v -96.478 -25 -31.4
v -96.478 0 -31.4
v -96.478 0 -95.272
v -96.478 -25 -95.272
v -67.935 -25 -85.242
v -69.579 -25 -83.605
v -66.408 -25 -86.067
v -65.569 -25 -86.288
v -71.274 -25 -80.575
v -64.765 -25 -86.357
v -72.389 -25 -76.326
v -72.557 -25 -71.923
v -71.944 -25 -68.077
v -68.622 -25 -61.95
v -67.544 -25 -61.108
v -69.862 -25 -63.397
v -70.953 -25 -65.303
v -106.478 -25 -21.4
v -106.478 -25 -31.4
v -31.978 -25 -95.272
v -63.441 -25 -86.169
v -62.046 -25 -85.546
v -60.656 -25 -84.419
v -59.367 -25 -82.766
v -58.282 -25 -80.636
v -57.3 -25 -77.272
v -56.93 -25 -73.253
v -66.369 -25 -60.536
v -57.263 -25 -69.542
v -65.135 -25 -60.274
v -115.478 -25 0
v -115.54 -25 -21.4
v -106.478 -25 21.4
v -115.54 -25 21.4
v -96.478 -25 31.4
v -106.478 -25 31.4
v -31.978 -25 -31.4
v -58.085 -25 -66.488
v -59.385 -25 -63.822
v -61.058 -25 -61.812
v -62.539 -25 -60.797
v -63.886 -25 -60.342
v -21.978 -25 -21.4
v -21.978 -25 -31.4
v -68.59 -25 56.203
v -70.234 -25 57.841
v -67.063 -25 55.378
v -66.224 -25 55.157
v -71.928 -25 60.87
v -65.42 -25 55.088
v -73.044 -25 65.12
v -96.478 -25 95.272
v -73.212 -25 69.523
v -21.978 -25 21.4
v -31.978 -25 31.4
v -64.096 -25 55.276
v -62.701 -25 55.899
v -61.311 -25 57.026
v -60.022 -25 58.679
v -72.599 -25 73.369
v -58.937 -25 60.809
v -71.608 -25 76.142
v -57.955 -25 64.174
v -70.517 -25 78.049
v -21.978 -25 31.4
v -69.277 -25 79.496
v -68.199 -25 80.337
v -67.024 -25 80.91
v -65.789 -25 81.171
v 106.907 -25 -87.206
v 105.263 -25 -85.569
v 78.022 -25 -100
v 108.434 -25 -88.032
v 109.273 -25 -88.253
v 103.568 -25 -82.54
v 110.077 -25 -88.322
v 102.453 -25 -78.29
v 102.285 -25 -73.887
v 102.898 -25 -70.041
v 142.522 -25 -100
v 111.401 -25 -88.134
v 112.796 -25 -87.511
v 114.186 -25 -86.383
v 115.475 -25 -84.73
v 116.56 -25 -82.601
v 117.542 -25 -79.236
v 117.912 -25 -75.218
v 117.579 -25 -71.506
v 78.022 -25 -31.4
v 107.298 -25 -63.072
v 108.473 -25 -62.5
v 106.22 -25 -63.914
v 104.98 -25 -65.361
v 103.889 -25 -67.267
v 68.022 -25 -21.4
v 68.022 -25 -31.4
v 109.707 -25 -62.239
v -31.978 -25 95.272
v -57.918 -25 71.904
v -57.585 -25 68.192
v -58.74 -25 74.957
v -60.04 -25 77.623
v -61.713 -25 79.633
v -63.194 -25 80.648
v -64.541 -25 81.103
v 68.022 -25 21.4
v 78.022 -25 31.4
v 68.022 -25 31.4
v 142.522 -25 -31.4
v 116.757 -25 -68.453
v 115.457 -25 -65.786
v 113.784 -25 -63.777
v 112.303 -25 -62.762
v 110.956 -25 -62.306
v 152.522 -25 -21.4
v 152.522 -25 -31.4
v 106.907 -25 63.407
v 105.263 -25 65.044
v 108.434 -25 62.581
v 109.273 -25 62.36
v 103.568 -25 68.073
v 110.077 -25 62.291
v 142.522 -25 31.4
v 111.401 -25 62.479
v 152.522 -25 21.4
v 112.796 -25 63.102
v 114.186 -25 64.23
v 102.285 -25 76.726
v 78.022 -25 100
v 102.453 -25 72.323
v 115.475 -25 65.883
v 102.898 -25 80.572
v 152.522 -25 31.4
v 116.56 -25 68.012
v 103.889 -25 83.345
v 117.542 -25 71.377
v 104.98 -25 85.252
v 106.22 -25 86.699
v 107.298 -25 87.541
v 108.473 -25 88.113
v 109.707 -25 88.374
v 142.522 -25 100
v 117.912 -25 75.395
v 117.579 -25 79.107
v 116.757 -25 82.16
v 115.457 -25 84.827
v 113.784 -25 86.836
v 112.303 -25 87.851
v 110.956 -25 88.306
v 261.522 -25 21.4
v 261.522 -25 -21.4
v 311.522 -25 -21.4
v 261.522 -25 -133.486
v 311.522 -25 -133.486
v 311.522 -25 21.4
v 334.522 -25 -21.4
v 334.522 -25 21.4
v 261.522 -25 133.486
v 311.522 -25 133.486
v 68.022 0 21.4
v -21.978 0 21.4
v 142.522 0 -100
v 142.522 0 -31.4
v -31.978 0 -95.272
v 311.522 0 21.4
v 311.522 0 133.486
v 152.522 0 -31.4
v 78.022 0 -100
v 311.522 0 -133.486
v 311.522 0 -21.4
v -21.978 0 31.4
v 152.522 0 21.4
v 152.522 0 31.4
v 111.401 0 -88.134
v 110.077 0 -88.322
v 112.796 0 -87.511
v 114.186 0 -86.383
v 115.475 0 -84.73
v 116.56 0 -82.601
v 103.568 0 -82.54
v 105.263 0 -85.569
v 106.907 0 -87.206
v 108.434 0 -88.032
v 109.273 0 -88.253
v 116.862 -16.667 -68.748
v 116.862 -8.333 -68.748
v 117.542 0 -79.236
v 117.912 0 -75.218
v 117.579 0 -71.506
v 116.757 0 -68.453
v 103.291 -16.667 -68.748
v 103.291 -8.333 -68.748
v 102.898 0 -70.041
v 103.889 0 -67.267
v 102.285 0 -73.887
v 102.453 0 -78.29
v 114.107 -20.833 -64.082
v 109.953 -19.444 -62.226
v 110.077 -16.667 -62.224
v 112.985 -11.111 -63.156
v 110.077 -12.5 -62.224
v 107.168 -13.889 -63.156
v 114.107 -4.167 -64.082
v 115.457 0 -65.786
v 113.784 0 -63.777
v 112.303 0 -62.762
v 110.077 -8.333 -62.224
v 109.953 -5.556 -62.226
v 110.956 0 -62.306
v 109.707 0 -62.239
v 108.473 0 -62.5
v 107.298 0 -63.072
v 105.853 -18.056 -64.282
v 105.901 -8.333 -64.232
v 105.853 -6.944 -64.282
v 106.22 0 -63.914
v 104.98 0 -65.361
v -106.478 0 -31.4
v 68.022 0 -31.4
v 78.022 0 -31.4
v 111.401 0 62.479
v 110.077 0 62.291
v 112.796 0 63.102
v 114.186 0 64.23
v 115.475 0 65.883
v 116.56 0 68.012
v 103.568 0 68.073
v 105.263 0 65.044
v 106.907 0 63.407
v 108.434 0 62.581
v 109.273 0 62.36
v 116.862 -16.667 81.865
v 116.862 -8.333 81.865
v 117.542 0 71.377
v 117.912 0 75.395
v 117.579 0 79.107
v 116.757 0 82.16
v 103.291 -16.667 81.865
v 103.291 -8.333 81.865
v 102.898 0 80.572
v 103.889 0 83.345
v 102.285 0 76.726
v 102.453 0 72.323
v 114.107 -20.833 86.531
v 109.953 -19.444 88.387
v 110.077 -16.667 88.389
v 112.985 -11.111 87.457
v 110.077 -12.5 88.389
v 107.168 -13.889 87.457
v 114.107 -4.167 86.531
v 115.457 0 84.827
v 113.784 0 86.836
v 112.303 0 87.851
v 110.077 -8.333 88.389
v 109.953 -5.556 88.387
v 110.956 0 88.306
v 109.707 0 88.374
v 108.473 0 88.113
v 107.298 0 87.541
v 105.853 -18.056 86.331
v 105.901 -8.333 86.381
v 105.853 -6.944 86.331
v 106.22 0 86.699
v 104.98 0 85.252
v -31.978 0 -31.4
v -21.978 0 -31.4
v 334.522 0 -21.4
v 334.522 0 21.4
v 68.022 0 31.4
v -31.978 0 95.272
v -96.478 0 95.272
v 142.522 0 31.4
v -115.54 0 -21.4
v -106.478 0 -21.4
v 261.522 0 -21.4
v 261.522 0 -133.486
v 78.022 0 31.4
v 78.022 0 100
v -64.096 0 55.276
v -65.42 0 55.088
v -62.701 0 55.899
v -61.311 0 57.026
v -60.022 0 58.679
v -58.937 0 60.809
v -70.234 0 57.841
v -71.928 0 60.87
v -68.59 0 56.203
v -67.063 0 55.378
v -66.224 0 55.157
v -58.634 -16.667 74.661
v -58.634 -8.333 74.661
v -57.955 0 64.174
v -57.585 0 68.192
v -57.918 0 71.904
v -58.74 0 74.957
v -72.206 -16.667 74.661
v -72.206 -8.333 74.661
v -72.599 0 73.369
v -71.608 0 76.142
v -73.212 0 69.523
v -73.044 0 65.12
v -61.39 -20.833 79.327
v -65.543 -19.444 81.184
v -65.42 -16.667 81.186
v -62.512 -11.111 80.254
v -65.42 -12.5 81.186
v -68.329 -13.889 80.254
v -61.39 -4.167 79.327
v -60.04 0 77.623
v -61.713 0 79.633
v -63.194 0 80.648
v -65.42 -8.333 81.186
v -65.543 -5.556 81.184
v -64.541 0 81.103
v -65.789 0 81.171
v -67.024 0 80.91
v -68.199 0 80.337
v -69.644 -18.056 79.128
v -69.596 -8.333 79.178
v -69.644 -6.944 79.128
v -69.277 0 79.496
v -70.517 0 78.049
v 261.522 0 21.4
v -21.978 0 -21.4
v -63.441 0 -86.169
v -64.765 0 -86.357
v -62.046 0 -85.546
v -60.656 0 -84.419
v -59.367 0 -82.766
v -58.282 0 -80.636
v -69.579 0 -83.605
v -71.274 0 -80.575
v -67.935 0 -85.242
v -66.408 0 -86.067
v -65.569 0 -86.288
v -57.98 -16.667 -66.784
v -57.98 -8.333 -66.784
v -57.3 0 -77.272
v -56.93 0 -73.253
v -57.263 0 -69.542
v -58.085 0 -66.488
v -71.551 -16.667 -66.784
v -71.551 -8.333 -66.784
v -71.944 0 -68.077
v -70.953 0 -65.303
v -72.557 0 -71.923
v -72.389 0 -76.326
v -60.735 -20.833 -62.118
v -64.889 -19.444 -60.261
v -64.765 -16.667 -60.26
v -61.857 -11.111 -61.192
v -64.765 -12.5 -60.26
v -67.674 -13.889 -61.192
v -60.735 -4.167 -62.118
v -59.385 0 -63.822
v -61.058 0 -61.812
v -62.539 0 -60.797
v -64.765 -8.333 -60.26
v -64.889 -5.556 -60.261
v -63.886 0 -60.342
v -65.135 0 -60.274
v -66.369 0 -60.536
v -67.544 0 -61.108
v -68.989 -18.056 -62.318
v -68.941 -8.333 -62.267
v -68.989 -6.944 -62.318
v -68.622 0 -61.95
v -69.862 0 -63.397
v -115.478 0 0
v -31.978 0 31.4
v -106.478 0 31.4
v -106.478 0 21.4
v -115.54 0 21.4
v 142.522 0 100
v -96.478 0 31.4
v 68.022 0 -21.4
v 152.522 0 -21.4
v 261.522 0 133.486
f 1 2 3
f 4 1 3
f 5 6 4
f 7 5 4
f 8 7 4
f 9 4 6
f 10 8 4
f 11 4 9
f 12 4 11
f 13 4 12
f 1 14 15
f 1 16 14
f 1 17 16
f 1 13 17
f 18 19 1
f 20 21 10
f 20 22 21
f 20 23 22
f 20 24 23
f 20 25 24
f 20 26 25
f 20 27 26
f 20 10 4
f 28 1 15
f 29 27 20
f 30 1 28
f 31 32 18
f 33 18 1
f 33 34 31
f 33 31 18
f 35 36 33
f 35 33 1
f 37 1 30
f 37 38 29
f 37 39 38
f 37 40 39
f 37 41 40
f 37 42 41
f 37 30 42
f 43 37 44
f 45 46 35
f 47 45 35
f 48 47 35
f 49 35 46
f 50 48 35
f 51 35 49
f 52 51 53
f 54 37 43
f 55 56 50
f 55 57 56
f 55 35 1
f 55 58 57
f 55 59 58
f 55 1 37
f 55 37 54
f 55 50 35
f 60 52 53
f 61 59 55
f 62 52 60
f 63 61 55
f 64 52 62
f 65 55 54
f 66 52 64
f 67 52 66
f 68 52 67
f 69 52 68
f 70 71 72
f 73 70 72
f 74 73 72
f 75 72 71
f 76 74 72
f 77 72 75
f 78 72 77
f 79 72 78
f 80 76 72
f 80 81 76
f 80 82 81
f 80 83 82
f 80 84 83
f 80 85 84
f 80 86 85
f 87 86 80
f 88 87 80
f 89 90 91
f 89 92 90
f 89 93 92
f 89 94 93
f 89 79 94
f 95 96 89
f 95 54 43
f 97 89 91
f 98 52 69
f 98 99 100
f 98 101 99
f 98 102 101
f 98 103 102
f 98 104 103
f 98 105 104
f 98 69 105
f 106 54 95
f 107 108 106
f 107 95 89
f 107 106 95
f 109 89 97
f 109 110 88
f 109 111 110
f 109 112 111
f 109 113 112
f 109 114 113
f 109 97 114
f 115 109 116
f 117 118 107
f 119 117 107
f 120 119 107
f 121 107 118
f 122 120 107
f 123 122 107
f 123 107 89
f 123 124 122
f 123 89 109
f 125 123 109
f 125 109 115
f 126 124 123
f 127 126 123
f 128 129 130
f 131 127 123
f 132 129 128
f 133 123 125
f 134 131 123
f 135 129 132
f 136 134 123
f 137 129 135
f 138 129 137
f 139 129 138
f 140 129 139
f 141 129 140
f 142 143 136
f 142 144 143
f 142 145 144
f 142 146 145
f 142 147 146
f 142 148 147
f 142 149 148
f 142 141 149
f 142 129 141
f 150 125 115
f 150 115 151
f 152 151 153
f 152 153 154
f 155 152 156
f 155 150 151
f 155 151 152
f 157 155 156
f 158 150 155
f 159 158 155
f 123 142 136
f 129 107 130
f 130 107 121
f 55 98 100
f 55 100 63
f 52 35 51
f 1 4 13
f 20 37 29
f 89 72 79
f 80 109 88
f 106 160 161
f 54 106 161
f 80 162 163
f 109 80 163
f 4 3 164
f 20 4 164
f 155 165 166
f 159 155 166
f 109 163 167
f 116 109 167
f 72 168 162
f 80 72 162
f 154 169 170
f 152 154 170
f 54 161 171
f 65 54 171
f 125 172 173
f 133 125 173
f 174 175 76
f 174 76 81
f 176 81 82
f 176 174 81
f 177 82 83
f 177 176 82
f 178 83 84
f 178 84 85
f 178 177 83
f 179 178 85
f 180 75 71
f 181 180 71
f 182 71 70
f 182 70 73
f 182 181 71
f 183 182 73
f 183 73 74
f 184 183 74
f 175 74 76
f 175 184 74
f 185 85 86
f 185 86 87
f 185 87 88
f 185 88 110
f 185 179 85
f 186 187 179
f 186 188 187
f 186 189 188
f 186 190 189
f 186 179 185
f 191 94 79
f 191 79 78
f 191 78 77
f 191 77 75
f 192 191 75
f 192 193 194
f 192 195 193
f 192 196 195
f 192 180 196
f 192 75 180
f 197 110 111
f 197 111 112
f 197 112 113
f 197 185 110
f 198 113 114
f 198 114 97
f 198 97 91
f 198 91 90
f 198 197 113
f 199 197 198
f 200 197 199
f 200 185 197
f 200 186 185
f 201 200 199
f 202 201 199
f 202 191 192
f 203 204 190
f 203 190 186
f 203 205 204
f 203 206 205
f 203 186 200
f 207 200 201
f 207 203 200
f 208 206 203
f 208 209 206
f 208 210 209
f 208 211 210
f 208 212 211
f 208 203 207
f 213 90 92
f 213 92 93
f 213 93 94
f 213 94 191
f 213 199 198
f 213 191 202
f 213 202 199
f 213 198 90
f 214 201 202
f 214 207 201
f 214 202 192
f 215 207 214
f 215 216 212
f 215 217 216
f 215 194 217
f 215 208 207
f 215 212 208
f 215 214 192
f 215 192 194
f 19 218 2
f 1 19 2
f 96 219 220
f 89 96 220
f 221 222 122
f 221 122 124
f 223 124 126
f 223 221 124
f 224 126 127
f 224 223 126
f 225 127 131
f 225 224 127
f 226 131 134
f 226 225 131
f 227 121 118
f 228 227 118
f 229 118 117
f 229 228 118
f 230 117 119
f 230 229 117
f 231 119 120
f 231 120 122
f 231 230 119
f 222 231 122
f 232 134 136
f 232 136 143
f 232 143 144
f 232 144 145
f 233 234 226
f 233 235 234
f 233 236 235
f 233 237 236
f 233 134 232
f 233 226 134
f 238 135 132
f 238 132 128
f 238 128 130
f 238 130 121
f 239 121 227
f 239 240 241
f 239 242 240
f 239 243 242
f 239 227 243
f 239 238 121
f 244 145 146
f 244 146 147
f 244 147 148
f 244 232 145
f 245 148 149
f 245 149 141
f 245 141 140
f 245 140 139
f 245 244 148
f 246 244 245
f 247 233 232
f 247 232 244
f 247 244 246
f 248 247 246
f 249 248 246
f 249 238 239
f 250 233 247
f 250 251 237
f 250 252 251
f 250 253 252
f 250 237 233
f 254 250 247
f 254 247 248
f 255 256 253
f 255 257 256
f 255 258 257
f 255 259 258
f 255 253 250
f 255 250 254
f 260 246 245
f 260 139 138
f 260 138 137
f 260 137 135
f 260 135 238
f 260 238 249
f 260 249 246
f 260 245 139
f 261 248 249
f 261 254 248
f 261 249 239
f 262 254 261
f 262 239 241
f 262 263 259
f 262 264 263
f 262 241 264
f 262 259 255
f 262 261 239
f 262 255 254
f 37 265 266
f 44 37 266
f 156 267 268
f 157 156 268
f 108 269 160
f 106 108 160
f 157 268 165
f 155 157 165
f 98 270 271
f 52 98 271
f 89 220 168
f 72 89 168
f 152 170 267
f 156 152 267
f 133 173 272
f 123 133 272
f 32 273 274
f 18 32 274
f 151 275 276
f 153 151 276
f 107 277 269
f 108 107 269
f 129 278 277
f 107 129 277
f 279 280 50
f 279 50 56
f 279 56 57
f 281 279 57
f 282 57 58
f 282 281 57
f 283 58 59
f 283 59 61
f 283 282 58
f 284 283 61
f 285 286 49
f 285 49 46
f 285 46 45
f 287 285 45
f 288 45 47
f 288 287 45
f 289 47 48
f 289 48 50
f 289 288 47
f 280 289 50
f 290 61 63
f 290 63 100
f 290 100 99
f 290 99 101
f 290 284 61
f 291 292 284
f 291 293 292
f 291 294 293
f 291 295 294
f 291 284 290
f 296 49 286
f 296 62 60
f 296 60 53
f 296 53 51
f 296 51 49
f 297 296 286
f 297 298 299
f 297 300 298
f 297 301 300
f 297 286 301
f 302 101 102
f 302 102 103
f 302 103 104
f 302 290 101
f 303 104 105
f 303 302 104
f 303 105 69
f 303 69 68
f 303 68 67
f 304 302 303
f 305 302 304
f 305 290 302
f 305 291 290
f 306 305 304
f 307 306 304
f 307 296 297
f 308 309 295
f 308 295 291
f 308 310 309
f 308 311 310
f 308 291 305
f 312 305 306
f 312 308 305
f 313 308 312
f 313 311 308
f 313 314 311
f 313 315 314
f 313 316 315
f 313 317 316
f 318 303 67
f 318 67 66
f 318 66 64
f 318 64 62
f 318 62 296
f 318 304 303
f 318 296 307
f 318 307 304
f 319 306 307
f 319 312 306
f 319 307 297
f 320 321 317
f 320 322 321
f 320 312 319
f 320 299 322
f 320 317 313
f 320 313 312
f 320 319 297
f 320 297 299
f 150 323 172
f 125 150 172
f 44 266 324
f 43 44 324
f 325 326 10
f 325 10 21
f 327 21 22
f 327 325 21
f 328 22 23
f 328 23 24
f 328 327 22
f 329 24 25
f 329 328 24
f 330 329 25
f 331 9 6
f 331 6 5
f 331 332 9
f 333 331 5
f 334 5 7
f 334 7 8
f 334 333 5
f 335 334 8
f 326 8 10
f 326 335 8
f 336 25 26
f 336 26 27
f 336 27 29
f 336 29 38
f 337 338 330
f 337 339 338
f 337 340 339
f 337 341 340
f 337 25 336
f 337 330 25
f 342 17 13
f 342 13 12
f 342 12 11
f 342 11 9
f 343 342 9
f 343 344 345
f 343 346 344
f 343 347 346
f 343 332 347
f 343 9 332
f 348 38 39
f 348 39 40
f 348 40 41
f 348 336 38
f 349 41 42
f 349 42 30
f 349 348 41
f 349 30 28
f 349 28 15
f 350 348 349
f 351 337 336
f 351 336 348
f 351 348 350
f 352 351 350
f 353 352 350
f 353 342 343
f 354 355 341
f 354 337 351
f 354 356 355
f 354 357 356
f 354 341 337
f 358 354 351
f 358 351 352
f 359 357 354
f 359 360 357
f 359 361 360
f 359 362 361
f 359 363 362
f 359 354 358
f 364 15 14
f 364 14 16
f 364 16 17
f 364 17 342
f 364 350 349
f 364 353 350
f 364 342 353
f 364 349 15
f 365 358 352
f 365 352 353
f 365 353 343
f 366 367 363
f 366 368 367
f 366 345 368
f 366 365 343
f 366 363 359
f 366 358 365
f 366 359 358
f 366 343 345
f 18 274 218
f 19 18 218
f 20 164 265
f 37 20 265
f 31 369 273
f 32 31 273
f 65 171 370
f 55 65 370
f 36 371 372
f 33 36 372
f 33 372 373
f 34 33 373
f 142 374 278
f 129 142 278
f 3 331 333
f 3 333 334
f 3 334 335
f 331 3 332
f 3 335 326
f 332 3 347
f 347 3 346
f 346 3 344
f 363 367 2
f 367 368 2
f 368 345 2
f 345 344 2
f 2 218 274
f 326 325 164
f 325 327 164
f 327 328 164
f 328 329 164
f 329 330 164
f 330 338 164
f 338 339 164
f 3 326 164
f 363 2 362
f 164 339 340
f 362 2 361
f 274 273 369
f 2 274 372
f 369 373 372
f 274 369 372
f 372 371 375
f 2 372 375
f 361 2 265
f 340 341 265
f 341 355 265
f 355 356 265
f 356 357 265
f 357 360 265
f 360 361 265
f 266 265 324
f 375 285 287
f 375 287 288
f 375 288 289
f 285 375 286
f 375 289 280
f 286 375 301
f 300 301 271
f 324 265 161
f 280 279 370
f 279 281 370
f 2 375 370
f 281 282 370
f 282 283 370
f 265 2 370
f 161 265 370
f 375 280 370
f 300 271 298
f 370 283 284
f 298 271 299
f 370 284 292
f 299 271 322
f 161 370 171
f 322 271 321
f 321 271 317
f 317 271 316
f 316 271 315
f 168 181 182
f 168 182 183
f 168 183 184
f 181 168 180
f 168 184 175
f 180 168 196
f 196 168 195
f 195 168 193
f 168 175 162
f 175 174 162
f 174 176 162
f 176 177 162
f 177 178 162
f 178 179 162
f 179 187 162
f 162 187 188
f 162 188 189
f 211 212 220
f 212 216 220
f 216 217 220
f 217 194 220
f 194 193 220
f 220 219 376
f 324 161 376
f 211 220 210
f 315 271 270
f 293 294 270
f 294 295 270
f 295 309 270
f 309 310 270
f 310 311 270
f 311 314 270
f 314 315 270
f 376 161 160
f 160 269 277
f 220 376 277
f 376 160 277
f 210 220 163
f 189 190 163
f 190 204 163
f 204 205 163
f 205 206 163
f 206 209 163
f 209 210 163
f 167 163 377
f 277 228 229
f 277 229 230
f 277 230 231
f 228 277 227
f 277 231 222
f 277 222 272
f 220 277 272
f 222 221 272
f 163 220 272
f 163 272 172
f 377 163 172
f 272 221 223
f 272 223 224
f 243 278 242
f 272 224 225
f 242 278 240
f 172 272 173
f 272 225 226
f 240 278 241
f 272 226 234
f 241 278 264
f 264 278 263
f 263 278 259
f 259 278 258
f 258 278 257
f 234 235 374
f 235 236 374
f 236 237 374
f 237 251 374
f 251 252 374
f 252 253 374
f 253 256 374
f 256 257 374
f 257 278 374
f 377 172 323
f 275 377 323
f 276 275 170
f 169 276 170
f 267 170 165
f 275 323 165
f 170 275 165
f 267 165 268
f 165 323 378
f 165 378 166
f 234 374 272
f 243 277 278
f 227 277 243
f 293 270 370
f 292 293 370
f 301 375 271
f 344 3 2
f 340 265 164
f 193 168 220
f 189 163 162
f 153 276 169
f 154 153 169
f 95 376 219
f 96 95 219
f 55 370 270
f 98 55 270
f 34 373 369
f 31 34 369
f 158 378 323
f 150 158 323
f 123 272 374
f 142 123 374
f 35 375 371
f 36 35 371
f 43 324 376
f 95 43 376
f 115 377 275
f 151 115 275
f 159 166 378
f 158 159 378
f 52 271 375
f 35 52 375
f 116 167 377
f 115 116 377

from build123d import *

# Parameters (mm, degrees)
F1_DEPTH = 25
F2_DEPTH = 25


with BuildPart() as f1:
    # F0 (on Front) → F1 (new body)
    with BuildSketch(Plane.XZ):
        Polygon((334.522346, -21.4), (334.522346, 0), (334.522346, 21.4), (311.522346, 21.4), (311.522346, 0), (311.522346, -21.4), align=None)
        Polygon((311.522346, 0), (311.522346, 21.4), (311.522346, 133.486167), (261.522346, 133.486167), (261.522346, 21.4), (261.522346, 0), (261.522346, -21.4), (261.522346, -133.486167), (311.522346, -133.486167), (311.522346, -21.4), align=None)
        Polygon((261.522346, 0), (261.522346, 21.4), (152.522346, 21.4), (152.522346, 0), (152.522346, -21.4), (261.522346, -21.4), align=None)
        Polygon((152.522346, 0), (152.522346, 21.4), (152.522346, 31.4), (142.522346, 31.4), (142.522346, 0), (142.522346, -31.4), (152.522346, -31.4), (152.522346, -21.4), align=None)
        Polygon((142.522346, 0), (142.522346, 31.4), (142.522346, 100), (78.022346, 100), (78.022346, 31.4), (78.022346, 0), (78.022346, -31.4), (78.022346, -100), (142.522346, -100), (142.522346, -31.4), align=None)
        with BuildLine():
            add(Edge.make_bspline(
                [(110.076547, -88.321767), (123.648199, -88.321767), (116.862373, -68.748459), (110.076547, -49.175151), (103.29072, -68.748459), (96.504894, -88.321767), (110.076547, -88.321767)],
                knots=[0, 0, 0, 2.094395, 2.094395, 4.18879, 4.18879, 6.283185, 6.283185, 6.283185], degree=2, weights=[1, 0.5, 1, 0.5, 1, 0.5, 1]))
        make_face(mode=Mode.SUBTRACT)
        with BuildLine():
            add(Edge.make_bspline(
                [(110.076547, 62.291205), (123.648199, 62.291205), (116.862373, 81.864513), (110.076547, 101.437821), (103.29072, 81.864513), (96.504894, 62.291205), (110.076547, 62.291205)],
                knots=[0, 0, 0, 2.094395, 2.094395, 4.18879, 4.18879, 6.283185, 6.283185, 6.283185], degree=2, weights=[1, 0.5, 1, 0.5, 1, 0.5, 1]))
        make_face(mode=Mode.SUBTRACT)
        Polygon((78.022346, 0), (78.022346, 31.4), (68.022346, 31.4), (68.022346, 21.4), (68.022346, 0), (68.022346, -21.4), (68.022346, -31.4), (78.022346, -31.4), align=None)
        Polygon((68.022346, 0), (68.022346, 21.4), (-21.977654, 21.4), (-21.977654, 0), (-21.977654, -21.4), (68.022346, -21.4), align=None)
        Polygon((-21.977654, 0), (-21.977654, 21.4), (-21.977654, 31.4), (-31.977654, 31.4), (-31.977654, 0), (-31.977654, -31.4), (-21.977654, -31.4), (-21.977654, -21.4), align=None)
        Polygon((-31.977654, 0), (-31.977654, 31.4), (-31.977654, 95.27199), (-96.477654, 95.27199), (-96.477654, 31.4), (-96.477654, 0), (-96.477654, -31.4), (-96.477654, -95.27199), (-31.977654, -95.27199), (-31.977654, -31.4), align=None)
        with BuildLine():
            add(Edge.make_bspline(
                [(-64.765468, -86.35725), (-51.193816, -86.35725), (-57.979642, -66.783942), (-64.765468, -47.210634), (-71.551294, -66.783942), (-78.337121, -86.35725), (-64.765468, -86.35725)],
                knots=[0, 0, 0, 2.094395, 2.094395, 4.18879, 4.18879, 6.283185, 6.283185, 6.283185], degree=2, weights=[1, 0.5, 1, 0.5, 1, 0.5, 1]))
        make_face(mode=Mode.SUBTRACT)
        with BuildLine():
            add(Edge.make_bspline(
                [(-65.420307, 55.087976), (-51.848655, 55.087976), (-58.634481, 74.661285), (-65.420307, 94.234593), (-72.206133, 74.661285), (-78.99196, 55.087976), (-65.420307, 55.087976)],
                knots=[0, 0, 0, 2.094395, 2.094395, 4.18879, 4.18879, 6.283185, 6.283185, 6.283185], degree=2, weights=[1, 0.5, 1, 0.5, 1, 0.5, 1]))
        make_face(mode=Mode.SUBTRACT)
        Polygon((-96.477654, 0), (-96.477654, 31.4), (-106.477654, 31.4), (-106.477654, 21.4), (-106.477654, 0), (-106.477654, -21.4), (-106.477654, -31.4), (-96.477654, -31.4), align=None)
        Polygon((-106.477654, 0), (-106.477654, 21.4), (-115.539879, 21.4), (-115.477654, 0), (-115.539879, -21.4), (-106.477654, -21.4), align=None)
    extrude(amount=F1_DEPTH)

    # F0 (on Front) → F2 (join)
    with BuildSketch(Plane.XZ):
        Polygon((334.522346, -21.4), (334.522346, 0), (334.522346, 21.4), (311.522346, 21.4), (311.522346, 0), (311.522346, -21.4), align=None)
        Polygon((311.522346, 0), (311.522346, 21.4), (311.522346, 133.486167), (261.522346, 133.486167), (261.522346, 21.4), (261.522346, 0), (261.522346, -21.4), (261.522346, -133.486167), (311.522346, -133.486167), (311.522346, -21.4), align=None)
        Polygon((261.522346, 0), (261.522346, 21.4), (152.522346, 21.4), (152.522346, 0), (152.522346, -21.4), (261.522346, -21.4), align=None)
        Polygon((152.522346, 0), (152.522346, 21.4), (152.522346, 31.4), (142.522346, 31.4), (142.522346, 0), (142.522346, -31.4), (152.522346, -31.4), (152.522346, -21.4), align=None)
        Polygon((142.522346, 0), (142.522346, 31.4), (142.522346, 100), (78.022346, 100), (78.022346, 31.4), (78.022346, 0), (78.022346, -31.4), (78.022346, -100), (142.522346, -100), (142.522346, -31.4), align=None)
        with BuildLine():
            add(Edge.make_bspline(
                [(110.076547, -88.321767), (123.648199, -88.321767), (116.862373, -68.748459), (110.076547, -49.175151), (103.29072, -68.748459), (96.504894, -88.321767), (110.076547, -88.321767)],
                knots=[0, 0, 0, 2.094395, 2.094395, 4.18879, 4.18879, 6.283185, 6.283185, 6.283185], degree=2, weights=[1, 0.5, 1, 0.5, 1, 0.5, 1]))
        make_face(mode=Mode.SUBTRACT)
        with BuildLine():
            add(Edge.make_bspline(
                [(110.076547, 62.291205), (123.648199, 62.291205), (116.862373, 81.864513), (110.076547, 101.437821), (103.29072, 81.864513), (96.504894, 62.291205), (110.076547, 62.291205)],
                knots=[0, 0, 0, 2.094395, 2.094395, 4.18879, 4.18879, 6.283185, 6.283185, 6.283185], degree=2, weights=[1, 0.5, 1, 0.5, 1, 0.5, 1]))
        make_face(mode=Mode.SUBTRACT)
        Polygon((78.022346, 0), (78.022346, 31.4), (68.022346, 31.4), (68.022346, 21.4), (68.022346, 0), (68.022346, -21.4), (68.022346, -31.4), (78.022346, -31.4), align=None)
        Polygon((68.022346, 0), (68.022346, 21.4), (-21.977654, 21.4), (-21.977654, 0), (-21.977654, -21.4), (68.022346, -21.4), align=None)
        Polygon((-21.977654, 0), (-21.977654, 21.4), (-21.977654, 31.4), (-31.977654, 31.4), (-31.977654, 0), (-31.977654, -31.4), (-21.977654, -31.4), (-21.977654, -21.4), align=None)
        Polygon((-31.977654, 0), (-31.977654, 31.4), (-31.977654, 95.27199), (-96.477654, 95.27199), (-96.477654, 31.4), (-96.477654, 0), (-96.477654, -31.4), (-96.477654, -95.27199), (-31.977654, -95.27199), (-31.977654, -31.4), align=None)
        with BuildLine():
            add(Edge.make_bspline(
                [(-64.765468, -86.35725), (-51.193816, -86.35725), (-57.979642, -66.783942), (-64.765468, -47.210634), (-71.551294, -66.783942), (-78.337121, -86.35725), (-64.765468, -86.35725)],
                knots=[0, 0, 0, 2.094395, 2.094395, 4.18879, 4.18879, 6.283185, 6.283185, 6.283185], degree=2, weights=[1, 0.5, 1, 0.5, 1, 0.5, 1]))
        make_face(mode=Mode.SUBTRACT)
        with BuildLine():
            add(Edge.make_bspline(
                [(-65.420307, 55.087976), (-51.848655, 55.087976), (-58.634481, 74.661285), (-65.420307, 94.234593), (-72.206133, 74.661285), (-78.99196, 55.087976), (-65.420307, 55.087976)],
                knots=[0, 0, 0, 2.094395, 2.094395, 4.18879, 4.18879, 6.283185, 6.283185, 6.283185], degree=2, weights=[1, 0.5, 1, 0.5, 1, 0.5, 1]))
        make_face(mode=Mode.SUBTRACT)
        Polygon((-96.477654, 0), (-96.477654, 31.4), (-106.477654, 31.4), (-106.477654, 21.4), (-106.477654, 0), (-106.477654, -21.4), (-106.477654, -31.4), (-96.477654, -31.4), align=None)
        Polygon((-106.477654, 0), (-106.477654, 21.4), (-115.539879, 21.4), (-115.477654, 0), (-115.539879, -21.4), (-106.477654, -21.4), align=None)
    extrude(amount=F2_DEPTH)


solid = f1.part
